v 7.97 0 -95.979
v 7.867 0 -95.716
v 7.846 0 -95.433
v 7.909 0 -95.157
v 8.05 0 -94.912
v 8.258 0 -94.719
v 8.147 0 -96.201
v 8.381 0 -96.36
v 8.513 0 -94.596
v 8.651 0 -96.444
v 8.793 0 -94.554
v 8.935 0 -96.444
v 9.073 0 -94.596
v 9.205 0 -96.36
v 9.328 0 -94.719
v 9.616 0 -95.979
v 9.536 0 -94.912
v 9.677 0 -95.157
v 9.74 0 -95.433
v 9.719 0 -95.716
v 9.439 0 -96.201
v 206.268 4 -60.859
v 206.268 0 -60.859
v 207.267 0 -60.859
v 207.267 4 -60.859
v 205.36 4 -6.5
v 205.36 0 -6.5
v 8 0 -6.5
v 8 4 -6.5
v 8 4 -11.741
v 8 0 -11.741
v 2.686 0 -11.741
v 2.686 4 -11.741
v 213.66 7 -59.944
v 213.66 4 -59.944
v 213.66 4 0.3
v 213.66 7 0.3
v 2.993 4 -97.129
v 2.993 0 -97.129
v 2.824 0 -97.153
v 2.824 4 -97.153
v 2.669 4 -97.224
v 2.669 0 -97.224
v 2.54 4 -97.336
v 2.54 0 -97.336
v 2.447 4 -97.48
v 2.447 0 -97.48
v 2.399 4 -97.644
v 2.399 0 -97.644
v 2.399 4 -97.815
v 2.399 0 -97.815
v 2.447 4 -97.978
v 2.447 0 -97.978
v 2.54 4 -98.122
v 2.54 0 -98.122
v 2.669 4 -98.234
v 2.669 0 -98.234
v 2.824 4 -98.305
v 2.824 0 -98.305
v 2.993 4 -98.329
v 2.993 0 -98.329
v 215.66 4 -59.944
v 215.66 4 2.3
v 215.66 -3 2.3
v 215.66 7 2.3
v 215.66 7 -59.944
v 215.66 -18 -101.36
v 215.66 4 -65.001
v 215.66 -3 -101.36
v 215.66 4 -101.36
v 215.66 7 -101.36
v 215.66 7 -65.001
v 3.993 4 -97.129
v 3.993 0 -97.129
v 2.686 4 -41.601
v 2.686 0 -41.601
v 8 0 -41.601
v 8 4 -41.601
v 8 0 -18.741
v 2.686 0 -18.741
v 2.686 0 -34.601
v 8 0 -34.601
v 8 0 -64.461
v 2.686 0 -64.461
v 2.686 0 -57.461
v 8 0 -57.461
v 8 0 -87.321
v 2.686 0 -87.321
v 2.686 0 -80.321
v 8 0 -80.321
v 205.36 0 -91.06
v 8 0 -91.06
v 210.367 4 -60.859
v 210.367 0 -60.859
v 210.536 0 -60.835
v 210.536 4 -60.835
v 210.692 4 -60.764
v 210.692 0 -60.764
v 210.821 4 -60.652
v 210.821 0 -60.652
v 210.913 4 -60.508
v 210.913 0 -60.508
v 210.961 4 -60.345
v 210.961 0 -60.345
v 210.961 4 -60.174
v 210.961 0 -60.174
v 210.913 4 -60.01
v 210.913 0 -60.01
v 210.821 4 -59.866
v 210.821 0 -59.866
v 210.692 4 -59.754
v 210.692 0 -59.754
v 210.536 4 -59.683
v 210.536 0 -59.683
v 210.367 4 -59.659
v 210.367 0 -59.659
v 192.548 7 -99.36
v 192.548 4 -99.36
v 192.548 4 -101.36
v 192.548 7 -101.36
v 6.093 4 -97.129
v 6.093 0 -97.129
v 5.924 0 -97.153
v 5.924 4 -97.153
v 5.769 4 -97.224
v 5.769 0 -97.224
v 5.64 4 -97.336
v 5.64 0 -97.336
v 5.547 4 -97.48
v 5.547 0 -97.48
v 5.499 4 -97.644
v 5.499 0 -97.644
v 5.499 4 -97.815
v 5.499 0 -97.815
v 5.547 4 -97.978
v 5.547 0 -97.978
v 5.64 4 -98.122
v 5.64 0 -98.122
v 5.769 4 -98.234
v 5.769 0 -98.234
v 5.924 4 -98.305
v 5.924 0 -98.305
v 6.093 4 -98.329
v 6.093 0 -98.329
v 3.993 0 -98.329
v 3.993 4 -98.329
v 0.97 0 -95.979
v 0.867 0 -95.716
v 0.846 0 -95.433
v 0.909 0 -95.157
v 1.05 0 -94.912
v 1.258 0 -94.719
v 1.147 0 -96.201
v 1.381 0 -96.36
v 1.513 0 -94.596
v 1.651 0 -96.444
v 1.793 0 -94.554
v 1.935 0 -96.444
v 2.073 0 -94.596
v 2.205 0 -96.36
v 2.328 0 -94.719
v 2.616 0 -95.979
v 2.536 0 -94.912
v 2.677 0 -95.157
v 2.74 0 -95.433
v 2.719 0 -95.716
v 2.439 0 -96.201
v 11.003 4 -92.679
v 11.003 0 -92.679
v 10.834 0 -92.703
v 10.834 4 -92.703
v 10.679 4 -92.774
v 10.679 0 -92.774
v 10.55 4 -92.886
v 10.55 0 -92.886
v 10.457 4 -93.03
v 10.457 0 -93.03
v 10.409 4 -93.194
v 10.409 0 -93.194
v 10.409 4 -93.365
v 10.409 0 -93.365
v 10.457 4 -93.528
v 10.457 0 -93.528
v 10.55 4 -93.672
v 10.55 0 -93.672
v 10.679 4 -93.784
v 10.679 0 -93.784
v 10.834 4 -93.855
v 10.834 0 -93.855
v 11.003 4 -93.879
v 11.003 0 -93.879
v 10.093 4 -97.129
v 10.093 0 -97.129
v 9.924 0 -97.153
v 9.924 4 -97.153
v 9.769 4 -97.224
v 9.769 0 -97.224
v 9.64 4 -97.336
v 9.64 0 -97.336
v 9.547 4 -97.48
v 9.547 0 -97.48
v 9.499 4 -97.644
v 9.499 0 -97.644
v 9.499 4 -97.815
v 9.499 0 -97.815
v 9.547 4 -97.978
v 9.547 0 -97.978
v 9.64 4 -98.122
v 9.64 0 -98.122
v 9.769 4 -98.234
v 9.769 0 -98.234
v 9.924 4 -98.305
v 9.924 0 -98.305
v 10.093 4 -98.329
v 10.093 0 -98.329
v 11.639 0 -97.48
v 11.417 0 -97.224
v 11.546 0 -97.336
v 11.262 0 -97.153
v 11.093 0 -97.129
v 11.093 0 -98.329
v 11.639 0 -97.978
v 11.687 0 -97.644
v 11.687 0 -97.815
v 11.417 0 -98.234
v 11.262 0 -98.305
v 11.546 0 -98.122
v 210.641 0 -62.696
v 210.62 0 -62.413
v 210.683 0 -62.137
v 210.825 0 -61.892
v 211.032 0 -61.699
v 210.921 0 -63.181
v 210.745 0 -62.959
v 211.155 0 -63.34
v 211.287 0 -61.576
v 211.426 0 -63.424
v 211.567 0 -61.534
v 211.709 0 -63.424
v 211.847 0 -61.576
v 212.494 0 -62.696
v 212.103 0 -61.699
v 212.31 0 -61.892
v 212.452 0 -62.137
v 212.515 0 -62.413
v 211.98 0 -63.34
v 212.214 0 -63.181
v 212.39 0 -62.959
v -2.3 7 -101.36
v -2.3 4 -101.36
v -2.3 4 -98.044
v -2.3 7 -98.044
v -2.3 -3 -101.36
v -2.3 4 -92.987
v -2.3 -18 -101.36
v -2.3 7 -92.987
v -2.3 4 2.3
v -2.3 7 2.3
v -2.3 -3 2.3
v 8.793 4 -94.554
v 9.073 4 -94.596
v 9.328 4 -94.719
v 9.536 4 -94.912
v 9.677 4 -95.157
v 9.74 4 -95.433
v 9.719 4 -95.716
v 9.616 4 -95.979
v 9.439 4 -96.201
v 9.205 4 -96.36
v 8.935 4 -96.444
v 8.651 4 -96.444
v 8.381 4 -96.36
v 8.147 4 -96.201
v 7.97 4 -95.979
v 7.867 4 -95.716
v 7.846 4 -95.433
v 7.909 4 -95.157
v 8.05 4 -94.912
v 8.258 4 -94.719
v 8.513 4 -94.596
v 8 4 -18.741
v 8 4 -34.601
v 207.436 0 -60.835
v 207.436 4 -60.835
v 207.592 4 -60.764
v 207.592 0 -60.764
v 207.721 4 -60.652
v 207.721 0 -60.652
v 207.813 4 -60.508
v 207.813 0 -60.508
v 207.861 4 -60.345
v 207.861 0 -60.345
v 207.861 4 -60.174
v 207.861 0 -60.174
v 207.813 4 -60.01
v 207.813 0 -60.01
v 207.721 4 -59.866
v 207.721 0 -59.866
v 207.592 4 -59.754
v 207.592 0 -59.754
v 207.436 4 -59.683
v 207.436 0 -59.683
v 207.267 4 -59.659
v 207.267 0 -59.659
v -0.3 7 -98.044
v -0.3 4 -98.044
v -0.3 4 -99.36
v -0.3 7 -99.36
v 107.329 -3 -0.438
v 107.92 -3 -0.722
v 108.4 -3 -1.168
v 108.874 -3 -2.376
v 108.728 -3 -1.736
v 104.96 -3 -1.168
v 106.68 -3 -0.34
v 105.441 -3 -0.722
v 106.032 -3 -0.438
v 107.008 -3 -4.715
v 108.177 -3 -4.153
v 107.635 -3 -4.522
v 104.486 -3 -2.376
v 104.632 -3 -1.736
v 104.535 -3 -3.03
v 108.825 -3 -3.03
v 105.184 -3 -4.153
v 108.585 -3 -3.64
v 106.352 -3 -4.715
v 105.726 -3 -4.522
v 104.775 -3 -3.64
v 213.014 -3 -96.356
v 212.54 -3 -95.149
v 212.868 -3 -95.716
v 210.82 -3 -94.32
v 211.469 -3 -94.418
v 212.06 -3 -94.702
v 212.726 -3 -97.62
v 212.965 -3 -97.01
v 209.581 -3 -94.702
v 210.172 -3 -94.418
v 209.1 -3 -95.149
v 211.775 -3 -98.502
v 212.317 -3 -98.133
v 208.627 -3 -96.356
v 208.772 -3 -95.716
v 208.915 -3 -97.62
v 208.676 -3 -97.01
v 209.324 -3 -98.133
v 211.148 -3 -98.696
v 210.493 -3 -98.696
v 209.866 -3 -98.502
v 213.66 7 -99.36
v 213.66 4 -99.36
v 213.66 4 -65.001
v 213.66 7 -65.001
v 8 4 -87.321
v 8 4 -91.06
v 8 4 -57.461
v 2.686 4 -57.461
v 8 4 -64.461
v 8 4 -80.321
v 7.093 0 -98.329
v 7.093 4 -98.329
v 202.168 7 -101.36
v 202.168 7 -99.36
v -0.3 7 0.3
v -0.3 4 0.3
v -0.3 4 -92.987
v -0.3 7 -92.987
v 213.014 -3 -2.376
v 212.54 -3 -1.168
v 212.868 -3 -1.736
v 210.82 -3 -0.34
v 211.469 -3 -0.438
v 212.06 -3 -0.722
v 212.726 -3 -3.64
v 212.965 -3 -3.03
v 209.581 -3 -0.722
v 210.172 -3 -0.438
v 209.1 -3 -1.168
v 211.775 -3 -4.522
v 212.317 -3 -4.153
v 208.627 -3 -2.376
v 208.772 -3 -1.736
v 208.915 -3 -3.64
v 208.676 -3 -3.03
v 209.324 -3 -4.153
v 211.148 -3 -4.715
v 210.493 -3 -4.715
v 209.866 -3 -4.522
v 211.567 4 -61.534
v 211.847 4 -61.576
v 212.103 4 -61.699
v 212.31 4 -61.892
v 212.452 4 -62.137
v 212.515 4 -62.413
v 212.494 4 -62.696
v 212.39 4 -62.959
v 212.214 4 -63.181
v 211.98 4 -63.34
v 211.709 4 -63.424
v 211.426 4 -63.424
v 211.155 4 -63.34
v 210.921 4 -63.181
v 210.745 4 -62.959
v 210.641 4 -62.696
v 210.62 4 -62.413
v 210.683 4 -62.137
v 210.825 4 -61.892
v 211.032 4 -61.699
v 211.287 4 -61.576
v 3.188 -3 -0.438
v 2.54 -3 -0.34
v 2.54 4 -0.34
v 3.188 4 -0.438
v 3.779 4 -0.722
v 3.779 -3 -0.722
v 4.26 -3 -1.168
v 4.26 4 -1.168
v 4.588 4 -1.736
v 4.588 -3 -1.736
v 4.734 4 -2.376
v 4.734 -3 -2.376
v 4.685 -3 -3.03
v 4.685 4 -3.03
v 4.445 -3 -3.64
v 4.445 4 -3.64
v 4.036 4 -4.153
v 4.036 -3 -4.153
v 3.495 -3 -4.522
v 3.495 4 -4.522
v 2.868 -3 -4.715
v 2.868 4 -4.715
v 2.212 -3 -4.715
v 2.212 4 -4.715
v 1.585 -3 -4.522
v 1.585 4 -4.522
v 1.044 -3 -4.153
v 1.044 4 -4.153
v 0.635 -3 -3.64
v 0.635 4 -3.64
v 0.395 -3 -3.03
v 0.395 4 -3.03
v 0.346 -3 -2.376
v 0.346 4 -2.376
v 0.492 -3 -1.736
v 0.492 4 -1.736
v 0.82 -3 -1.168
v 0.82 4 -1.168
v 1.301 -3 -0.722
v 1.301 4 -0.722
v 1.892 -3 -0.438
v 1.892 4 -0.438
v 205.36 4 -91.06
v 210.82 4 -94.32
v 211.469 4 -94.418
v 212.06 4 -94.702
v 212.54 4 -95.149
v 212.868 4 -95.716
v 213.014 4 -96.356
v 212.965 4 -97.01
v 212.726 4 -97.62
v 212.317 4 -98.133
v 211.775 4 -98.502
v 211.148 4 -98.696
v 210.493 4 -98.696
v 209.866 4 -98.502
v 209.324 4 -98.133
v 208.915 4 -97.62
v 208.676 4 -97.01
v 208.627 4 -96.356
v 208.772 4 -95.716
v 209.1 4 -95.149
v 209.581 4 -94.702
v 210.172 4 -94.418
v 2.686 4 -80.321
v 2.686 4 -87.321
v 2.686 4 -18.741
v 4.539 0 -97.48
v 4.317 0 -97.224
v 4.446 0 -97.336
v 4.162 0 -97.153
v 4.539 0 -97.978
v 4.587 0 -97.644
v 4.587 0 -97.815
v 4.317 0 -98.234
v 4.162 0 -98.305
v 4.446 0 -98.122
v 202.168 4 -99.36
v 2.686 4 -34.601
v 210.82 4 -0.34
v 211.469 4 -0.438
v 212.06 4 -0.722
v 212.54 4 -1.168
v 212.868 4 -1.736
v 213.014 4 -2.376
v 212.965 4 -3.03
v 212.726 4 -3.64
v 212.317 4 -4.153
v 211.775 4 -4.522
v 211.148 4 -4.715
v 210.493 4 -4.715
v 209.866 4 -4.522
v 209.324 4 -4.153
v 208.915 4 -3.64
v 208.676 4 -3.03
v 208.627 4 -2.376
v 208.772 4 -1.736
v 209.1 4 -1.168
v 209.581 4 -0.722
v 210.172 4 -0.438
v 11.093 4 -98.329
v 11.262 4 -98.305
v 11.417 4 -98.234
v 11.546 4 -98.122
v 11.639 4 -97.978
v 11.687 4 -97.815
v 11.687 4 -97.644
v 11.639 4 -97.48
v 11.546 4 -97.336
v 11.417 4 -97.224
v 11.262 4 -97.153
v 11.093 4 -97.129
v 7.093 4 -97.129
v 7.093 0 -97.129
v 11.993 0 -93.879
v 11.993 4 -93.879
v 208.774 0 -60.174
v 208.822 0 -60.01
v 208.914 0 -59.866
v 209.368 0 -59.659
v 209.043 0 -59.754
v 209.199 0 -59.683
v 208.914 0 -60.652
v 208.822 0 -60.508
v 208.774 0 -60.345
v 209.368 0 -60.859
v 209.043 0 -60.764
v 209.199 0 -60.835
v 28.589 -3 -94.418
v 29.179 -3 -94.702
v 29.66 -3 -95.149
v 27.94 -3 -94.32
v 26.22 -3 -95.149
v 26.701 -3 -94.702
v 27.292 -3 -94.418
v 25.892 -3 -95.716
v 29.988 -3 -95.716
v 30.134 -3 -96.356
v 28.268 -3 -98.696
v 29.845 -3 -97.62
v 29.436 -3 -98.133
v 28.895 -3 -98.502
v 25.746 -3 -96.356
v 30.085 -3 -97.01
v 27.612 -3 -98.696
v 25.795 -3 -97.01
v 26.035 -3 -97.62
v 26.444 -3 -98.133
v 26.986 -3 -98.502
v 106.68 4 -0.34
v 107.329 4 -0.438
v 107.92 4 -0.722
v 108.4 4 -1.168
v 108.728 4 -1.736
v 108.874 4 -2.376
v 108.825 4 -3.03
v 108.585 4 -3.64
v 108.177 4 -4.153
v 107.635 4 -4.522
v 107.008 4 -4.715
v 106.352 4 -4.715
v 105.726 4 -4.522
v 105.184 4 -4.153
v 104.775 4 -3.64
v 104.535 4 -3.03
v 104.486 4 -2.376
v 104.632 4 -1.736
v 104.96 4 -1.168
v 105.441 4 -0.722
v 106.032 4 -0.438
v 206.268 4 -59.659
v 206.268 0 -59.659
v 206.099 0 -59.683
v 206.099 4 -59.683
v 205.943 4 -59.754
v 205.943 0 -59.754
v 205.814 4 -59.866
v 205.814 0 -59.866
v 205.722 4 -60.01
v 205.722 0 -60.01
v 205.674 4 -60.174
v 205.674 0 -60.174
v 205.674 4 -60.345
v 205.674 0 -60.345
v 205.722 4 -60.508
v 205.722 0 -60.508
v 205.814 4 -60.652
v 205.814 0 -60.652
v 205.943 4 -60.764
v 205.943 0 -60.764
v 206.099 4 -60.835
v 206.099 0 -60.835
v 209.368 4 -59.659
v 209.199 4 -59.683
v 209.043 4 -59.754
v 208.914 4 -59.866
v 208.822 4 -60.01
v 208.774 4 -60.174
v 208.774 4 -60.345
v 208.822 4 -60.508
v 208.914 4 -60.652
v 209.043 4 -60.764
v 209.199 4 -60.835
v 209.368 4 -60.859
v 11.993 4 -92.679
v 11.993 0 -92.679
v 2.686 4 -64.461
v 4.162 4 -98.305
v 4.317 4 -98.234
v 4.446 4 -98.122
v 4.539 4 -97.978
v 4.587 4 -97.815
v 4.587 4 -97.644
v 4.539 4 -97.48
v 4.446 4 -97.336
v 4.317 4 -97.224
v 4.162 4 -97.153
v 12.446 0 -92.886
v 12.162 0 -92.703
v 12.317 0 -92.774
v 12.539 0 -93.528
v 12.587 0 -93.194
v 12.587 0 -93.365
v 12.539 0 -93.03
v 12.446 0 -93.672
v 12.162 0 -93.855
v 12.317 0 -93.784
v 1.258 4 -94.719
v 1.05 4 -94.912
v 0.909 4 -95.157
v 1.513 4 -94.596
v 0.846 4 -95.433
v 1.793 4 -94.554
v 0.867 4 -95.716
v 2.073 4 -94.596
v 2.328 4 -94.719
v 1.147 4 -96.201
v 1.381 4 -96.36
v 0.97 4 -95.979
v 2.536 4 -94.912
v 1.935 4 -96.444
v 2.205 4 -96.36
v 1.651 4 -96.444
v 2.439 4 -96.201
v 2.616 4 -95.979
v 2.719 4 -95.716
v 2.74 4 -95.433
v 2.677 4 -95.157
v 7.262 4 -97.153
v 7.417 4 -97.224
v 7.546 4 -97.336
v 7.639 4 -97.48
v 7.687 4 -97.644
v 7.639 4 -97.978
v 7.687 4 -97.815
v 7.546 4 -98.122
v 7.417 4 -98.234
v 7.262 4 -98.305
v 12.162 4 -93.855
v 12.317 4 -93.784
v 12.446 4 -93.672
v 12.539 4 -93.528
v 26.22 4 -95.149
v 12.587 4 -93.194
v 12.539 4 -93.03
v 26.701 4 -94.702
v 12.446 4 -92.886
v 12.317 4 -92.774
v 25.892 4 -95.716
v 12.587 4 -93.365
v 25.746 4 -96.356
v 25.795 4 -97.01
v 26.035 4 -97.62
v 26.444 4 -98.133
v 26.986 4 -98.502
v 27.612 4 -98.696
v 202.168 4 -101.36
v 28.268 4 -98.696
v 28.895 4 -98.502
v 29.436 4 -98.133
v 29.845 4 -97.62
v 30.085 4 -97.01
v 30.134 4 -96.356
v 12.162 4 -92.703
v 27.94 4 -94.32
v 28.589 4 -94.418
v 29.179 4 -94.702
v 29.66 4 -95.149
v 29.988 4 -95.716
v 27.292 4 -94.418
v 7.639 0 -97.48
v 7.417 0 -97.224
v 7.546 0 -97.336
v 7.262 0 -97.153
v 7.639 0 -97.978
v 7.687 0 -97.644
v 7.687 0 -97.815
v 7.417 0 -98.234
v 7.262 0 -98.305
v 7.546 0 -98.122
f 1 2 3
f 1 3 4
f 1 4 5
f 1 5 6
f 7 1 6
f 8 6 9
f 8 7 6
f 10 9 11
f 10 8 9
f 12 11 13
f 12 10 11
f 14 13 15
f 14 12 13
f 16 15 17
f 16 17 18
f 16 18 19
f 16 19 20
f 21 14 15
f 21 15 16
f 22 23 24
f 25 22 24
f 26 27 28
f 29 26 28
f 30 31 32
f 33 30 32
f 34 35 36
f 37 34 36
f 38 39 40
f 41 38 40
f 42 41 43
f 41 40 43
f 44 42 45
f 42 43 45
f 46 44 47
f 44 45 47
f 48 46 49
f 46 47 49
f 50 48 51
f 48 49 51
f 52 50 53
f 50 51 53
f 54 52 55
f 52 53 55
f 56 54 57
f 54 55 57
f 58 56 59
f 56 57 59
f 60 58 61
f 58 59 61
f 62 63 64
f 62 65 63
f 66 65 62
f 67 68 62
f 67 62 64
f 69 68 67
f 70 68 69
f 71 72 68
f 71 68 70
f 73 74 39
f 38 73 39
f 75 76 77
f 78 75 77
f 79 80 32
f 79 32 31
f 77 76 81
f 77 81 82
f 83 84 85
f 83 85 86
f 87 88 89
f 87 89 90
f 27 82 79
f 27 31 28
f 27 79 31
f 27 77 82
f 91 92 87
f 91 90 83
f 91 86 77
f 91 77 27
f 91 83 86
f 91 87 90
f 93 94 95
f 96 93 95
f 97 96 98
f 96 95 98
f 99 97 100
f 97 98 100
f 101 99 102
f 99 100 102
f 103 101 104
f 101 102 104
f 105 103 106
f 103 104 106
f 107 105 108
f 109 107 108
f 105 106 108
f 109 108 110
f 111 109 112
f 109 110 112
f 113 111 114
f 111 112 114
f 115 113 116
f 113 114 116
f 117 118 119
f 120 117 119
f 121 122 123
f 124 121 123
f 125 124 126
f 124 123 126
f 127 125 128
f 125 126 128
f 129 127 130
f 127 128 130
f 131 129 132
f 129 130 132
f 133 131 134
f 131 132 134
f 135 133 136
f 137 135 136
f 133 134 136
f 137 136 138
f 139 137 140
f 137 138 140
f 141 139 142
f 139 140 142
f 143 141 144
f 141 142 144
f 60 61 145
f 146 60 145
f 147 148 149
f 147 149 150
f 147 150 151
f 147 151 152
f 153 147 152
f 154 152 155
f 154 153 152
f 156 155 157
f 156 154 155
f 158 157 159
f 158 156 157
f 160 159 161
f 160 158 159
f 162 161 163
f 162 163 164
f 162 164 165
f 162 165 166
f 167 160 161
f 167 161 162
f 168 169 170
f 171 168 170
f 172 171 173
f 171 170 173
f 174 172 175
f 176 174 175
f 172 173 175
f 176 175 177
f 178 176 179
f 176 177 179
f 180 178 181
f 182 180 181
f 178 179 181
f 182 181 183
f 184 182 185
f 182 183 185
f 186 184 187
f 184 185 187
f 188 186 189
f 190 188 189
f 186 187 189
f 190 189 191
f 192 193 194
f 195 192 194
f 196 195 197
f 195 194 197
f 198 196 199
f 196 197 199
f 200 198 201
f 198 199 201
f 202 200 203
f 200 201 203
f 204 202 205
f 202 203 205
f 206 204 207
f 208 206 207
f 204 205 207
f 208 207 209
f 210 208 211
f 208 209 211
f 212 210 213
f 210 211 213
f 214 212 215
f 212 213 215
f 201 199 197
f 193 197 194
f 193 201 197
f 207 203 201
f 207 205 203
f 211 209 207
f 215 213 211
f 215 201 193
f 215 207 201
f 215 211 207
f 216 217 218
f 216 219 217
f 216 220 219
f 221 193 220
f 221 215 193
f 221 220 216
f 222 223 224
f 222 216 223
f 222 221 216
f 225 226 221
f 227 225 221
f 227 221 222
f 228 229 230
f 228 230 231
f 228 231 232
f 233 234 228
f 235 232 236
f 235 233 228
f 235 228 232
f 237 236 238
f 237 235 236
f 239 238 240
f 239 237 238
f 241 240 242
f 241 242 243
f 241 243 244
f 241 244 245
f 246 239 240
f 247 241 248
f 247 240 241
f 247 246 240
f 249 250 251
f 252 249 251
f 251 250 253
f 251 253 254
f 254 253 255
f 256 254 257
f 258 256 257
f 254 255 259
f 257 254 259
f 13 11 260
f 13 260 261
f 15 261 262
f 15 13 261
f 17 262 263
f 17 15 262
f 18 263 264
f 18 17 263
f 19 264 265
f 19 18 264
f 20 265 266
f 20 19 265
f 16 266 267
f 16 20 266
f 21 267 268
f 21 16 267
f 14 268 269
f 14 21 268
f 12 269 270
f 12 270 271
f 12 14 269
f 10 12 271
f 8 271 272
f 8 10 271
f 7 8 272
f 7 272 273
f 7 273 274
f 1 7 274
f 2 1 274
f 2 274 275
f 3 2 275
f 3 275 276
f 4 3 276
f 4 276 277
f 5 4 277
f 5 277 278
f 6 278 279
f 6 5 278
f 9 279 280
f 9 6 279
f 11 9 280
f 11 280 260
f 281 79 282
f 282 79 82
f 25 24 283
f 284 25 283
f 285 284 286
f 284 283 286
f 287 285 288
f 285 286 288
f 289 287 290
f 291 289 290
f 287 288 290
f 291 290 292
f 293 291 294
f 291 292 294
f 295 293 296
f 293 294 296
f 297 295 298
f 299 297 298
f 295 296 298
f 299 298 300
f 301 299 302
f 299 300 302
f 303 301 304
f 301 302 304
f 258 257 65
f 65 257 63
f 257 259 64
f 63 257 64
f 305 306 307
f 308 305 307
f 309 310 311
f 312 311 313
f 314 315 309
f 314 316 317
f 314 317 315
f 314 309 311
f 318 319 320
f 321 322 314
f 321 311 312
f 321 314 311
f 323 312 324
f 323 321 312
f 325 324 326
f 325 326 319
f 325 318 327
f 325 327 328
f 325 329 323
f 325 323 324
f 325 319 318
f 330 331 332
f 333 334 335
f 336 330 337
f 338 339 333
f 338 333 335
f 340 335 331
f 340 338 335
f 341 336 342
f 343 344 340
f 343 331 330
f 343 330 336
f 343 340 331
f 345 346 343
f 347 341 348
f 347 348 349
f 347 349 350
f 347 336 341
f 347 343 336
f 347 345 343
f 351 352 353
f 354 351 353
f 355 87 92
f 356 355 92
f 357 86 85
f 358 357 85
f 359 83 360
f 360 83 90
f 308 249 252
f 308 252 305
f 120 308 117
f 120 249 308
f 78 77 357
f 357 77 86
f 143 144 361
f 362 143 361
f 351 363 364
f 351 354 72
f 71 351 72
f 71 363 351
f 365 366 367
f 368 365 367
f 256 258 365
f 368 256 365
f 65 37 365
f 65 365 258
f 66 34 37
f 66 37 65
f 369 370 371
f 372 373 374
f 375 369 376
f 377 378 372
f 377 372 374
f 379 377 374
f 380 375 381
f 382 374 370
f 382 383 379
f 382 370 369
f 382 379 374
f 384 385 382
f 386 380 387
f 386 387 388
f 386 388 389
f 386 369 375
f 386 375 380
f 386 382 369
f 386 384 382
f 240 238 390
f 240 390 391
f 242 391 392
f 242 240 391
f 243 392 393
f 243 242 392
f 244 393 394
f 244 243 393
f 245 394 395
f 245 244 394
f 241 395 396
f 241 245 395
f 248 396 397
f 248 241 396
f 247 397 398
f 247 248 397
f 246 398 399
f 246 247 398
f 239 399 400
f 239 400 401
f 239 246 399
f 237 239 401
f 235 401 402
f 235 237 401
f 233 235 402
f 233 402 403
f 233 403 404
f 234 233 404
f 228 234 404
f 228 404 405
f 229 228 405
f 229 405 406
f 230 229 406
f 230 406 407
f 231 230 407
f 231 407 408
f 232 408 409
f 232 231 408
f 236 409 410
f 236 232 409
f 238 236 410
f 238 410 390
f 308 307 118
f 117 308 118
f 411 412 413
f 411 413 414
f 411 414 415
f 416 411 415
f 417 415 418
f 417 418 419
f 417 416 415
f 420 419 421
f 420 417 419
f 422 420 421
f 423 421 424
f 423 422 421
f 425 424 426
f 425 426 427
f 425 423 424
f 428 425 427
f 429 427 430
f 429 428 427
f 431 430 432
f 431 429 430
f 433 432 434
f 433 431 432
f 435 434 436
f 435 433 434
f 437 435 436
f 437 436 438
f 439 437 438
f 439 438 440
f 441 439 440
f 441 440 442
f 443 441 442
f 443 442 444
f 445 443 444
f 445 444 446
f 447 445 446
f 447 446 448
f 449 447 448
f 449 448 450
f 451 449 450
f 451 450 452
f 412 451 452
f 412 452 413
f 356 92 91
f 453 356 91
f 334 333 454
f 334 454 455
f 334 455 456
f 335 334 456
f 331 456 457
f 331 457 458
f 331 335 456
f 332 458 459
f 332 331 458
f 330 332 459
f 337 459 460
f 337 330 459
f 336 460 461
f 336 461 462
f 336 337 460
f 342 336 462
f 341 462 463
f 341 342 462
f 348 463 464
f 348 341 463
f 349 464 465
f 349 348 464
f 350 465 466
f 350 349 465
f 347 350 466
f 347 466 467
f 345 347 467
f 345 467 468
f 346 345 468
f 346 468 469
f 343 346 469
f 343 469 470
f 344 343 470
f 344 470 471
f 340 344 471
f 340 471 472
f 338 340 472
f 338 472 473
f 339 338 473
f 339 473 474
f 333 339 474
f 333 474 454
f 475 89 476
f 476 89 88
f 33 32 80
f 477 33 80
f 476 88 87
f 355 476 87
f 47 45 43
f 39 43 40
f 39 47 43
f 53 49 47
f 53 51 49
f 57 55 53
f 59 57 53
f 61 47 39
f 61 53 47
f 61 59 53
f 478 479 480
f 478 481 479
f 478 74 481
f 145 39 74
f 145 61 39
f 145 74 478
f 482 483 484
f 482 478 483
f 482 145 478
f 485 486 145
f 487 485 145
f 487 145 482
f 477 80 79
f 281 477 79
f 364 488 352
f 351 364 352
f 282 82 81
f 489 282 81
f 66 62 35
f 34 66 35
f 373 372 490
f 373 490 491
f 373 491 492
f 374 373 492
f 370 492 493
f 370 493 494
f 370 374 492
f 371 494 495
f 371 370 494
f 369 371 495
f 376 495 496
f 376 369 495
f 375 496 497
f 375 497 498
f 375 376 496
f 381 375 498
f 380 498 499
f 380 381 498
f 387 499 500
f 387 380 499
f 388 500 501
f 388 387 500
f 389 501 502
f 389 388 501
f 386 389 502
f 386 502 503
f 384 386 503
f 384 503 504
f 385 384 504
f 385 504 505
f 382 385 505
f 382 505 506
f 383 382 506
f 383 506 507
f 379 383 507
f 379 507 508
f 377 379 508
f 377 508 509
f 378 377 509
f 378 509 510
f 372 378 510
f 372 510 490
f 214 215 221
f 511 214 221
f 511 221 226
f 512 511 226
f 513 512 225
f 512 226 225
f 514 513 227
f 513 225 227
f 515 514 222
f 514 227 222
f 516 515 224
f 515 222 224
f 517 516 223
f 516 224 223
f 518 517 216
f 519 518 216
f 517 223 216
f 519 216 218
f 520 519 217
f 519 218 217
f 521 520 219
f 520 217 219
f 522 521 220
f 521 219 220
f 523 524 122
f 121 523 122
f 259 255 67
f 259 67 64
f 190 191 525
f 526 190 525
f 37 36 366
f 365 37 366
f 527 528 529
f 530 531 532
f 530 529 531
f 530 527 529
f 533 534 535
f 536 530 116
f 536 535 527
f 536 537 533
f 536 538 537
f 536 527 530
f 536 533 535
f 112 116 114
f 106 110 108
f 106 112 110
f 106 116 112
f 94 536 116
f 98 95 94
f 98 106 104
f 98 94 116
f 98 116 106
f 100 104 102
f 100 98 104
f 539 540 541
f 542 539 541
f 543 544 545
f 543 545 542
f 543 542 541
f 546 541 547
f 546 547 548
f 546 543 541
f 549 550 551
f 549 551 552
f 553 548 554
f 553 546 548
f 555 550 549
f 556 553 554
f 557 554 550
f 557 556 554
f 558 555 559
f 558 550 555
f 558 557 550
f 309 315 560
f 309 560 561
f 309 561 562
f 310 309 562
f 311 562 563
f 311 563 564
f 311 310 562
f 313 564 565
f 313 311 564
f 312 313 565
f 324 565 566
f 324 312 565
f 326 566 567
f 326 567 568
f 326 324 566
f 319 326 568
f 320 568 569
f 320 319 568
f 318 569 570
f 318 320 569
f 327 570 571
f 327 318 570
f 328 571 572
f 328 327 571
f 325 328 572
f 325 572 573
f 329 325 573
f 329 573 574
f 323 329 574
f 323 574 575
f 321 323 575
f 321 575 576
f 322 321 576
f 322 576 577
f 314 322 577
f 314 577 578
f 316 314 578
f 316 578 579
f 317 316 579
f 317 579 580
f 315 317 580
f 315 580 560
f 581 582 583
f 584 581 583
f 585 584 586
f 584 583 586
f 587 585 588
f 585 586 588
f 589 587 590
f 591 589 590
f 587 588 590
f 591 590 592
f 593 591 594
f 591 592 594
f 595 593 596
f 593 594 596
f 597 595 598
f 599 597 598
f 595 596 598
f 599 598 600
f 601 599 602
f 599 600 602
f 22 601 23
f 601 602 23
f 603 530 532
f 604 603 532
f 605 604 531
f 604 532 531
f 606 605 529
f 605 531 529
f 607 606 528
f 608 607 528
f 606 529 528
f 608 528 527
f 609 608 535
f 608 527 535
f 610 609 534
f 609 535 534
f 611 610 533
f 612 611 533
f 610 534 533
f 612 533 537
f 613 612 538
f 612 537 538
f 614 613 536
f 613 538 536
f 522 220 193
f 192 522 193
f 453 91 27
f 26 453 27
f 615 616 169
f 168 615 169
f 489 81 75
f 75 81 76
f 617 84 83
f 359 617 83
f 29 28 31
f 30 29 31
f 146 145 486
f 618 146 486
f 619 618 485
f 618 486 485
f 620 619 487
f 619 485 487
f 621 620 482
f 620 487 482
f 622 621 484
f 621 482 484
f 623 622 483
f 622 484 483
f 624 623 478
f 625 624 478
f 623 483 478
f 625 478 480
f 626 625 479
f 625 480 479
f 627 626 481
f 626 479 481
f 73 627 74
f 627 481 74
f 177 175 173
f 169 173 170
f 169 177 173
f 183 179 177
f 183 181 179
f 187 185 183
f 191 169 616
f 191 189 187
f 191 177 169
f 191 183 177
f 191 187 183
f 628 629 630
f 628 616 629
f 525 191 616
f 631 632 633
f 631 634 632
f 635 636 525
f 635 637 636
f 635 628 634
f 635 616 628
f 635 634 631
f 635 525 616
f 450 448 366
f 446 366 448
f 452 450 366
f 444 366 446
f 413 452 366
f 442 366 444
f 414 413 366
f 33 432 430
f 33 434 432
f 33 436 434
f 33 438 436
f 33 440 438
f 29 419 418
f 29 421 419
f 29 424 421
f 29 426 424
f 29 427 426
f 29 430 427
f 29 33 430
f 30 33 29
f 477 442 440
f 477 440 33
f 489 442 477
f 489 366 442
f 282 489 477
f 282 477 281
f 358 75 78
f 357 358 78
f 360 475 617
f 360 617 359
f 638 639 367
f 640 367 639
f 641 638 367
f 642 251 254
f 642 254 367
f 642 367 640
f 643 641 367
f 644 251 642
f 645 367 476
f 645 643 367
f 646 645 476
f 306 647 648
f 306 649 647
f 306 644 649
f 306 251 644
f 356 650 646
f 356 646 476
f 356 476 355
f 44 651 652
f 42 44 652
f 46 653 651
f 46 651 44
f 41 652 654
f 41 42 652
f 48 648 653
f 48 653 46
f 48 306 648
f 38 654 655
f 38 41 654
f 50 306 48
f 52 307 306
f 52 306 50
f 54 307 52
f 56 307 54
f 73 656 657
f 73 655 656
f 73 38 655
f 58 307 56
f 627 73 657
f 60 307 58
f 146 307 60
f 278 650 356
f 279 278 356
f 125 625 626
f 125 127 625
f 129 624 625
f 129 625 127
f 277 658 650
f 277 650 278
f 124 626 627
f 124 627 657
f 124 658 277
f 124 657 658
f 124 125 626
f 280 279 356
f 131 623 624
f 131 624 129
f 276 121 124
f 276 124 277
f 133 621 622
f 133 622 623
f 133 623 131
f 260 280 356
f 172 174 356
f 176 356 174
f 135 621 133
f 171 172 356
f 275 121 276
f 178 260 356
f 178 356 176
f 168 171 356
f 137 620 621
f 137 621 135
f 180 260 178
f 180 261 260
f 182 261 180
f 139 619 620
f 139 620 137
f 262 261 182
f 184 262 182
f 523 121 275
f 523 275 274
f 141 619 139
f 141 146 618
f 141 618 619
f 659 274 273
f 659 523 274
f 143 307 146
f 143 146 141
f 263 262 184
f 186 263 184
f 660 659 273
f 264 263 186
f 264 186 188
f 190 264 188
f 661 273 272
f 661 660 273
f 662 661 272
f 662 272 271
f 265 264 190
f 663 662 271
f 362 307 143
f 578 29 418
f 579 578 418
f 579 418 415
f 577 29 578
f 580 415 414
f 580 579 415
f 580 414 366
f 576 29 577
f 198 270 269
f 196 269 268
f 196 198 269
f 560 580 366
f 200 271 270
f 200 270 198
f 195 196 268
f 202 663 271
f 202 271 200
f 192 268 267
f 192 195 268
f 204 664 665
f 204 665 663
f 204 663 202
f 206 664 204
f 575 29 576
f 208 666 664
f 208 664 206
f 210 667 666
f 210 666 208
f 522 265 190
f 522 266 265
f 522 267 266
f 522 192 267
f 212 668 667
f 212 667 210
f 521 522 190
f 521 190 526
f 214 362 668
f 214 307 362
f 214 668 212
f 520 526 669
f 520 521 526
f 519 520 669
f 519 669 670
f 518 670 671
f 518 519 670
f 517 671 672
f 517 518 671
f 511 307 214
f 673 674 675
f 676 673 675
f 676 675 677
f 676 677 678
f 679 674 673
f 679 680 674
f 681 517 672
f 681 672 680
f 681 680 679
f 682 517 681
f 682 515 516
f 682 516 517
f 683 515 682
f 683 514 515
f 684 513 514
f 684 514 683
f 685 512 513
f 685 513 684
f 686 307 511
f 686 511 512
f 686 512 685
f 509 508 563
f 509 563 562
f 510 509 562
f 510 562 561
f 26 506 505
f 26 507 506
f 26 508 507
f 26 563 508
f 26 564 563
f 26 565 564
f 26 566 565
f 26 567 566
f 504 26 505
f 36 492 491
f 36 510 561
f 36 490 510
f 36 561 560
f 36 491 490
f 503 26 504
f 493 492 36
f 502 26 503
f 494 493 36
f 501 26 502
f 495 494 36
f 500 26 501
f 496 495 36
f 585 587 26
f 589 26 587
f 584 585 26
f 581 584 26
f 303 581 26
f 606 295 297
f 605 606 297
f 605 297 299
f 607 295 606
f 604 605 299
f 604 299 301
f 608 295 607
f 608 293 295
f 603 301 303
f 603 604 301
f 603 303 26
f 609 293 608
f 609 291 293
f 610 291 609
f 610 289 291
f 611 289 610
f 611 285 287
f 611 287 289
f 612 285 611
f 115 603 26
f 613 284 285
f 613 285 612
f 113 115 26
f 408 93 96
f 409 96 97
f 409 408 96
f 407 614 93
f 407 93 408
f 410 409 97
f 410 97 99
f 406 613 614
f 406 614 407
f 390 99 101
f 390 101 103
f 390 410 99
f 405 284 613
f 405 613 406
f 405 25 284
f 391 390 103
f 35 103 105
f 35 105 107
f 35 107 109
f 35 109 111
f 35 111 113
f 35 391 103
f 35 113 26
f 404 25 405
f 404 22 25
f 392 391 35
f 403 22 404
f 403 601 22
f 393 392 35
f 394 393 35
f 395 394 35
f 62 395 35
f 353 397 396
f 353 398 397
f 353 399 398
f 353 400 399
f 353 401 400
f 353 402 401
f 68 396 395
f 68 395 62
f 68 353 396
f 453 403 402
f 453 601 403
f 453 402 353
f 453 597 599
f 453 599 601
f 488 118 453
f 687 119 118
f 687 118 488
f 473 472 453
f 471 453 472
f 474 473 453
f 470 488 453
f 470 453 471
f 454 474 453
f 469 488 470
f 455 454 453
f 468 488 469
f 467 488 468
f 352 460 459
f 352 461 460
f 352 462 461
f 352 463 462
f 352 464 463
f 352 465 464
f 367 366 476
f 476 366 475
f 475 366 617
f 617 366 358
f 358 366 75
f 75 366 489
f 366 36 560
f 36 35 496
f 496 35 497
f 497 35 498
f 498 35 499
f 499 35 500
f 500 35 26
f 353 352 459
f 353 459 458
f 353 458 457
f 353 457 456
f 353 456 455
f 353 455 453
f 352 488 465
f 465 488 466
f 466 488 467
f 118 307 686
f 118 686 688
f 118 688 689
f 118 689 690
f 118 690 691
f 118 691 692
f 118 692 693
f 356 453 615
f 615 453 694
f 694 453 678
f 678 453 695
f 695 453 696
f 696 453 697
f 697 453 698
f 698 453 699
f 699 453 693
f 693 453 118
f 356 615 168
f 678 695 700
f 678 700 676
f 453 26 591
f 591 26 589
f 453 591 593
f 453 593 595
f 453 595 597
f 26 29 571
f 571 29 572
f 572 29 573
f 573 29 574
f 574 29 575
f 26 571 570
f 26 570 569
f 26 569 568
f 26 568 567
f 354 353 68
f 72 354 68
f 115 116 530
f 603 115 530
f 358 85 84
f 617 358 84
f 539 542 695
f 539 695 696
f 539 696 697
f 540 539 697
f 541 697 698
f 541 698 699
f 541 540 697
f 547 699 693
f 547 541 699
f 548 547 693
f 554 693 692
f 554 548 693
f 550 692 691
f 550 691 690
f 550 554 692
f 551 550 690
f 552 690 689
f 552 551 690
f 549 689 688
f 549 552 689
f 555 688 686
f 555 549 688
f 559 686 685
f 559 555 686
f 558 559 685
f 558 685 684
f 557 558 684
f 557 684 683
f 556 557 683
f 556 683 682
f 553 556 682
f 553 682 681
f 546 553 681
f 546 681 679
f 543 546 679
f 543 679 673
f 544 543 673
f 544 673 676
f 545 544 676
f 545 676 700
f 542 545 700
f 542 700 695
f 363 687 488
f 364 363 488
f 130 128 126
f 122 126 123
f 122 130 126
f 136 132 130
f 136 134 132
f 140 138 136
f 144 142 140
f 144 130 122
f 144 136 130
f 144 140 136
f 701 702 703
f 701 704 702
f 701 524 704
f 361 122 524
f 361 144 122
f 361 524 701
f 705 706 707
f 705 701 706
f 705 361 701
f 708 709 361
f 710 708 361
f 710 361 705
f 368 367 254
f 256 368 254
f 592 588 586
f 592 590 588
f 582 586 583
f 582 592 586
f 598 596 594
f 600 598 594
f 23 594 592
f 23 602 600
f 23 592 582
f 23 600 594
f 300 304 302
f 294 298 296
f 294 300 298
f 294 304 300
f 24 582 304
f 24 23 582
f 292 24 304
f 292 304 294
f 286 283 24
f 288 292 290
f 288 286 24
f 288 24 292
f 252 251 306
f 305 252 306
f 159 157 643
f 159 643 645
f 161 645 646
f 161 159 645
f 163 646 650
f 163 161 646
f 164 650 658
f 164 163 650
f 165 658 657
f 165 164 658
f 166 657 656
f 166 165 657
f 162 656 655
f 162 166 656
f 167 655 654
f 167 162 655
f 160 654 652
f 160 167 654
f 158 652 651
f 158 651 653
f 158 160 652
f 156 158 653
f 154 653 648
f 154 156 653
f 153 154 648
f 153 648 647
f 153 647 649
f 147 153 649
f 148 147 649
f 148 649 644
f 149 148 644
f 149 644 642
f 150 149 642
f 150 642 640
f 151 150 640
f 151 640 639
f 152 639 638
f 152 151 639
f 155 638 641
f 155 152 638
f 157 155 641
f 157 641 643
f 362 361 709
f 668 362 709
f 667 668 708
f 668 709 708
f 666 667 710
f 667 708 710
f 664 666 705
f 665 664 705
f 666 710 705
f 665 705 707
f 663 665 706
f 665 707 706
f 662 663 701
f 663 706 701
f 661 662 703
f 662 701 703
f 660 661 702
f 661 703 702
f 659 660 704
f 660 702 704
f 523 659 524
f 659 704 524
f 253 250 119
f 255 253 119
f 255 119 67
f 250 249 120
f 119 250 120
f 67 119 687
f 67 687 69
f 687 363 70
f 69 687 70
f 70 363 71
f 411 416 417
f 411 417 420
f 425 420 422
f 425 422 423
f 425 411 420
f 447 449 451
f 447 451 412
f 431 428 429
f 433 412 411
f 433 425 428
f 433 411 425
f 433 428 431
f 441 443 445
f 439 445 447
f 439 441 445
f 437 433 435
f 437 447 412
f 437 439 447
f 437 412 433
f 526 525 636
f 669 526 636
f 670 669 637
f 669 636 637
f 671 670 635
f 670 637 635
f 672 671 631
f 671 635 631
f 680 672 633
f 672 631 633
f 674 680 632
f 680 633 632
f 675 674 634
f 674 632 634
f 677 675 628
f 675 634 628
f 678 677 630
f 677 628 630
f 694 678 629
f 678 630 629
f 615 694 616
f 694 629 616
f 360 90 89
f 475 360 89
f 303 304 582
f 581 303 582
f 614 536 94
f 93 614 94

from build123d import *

# Parameters (mm, degrees)
SKETCH4_W           = 217.960426721
SKETCH4_H           = 103.66019812
SKETCH4_R           = 2.2
SKETCH4_R_2         = 0.95
BOSS_EXTRUDE1_DEPTH = 4
SKETCH4_7_W         = 217.960426721
SKETCH4_7_H         = 103.66019812
BOSS_EXTRUDE2_DEPTH = 3
CUT_EXTRUDE1_START  = -3
SKETCH4_8_R         = 2.2
CUT_EXTRUDE1_DEPTH  = 3
BOSS_EXTRUDE3_START = 4
BOSS_EXTRUDE3_DEPTH = 3
BOSS_EXTRUDE4_DEPTH = 217.960426721


with BuildPart() as part:
    # Sketch4 → Boss-Extrude1 (new body)
    with BuildSketch(Plane(origin=(0, 0, 0), x_dir=(1, 0, 0), z_dir=(0, 1, 0))):
        with Locations((106.680213361, 49.53009906)):
            Rectangle(SKETCH4_W, SKETCH4_H)
        with Locations(Location((2.54000508, 2.54000508, 0), (0, 0, 270))):
            Circle(SKETCH4_R, mode=Mode.SUBTRACT)
        with Locations(Location((106.68021336, 2.54000508, 0), (0, 0, 270))):
            Circle(SKETCH4_R, mode=Mode.SUBTRACT)
        Polygon((205.360426721, 91.06019812), (205.360426721, 6.5), (8, 6.5), (8, 11.741046482), (2.686004572, 11.741046482), (2.686004572, 18.741046482), (8, 18.741046482), (8, 34.601092202), (2.686004572, 34.601092202), (2.686004572, 41.601092202), (8, 41.601092202), (8, 57.461137922), (2.686004572, 57.461137922), (2.686004572, 64.461137922), (8, 64.461137922), (8, 80.321183642), (2.686004572, 80.321183642), (2.686004572, 87.321183642), (8, 87.321183642), (8, 91.06019812), align=None, mode=Mode.SUBTRACT)
        with Locations(Location((210.820421641, 2.54000508, 0), (0, 0, 270))):
            Circle(SKETCH4_R, mode=Mode.SUBTRACT)
        with Locations(Location((1.792989586, 95.504191008, 0), (0, 0, 270))):
            Circle(SKETCH4_R_2, mode=Mode.SUBTRACT)
        with BuildLine():
            ThreePointArc((11.003022606, 92.679171958), (10.403022606, 93.279171958), (11.003022606, 93.879171958))
            Line((11.003022606, 93.879171958), (11.992807214, 93.879171958))
            ThreePointArc((11.992807214, 93.879171958), (12.592808272, 93.279171958), (11.992807214, 92.679171958))
            Line((11.992807214, 92.679171958), (11.003022606, 92.679171958))
        make_face(mode=Mode.SUBTRACT)
        with Locations(Location((8.792989586, 95.504191008, 0), (0, 0, 270))):
            Circle(SKETCH4_R_2, mode=Mode.SUBTRACT)
        with BuildLine():
            ThreePointArc((2.993222758, 97.129182542), (2.393222758, 97.729182542), (2.993222758, 98.329182542))
            Line((2.993222758, 98.329182542), (3.992807214, 98.329182542))
            ThreePointArc((3.992807214, 98.329182542), (4.592807214, 97.729182542), (3.992807214, 97.129182542))
            Line((3.992807214, 97.129182542), (2.993222758, 97.129182542))
        make_face(mode=Mode.SUBTRACT)
        with BuildLine():
            ThreePointArc((6.093221234, 97.129182542), (5.493221234, 97.729182542), (6.093221234, 98.329182542))
            Line((6.093221234, 98.329182542), (7.09280569, 98.329182542))
            ThreePointArc((7.09280569, 98.329182542), (7.69280569, 97.729182542), (7.09280569, 97.129182542))
            Line((7.09280569, 97.129182542), (6.093221234, 97.129182542))
        make_face(mode=Mode.SUBTRACT)
        with BuildLine():
            ThreePointArc((10.093221234, 97.129182542), (9.493221234, 97.729182542), (10.093221234, 98.329182542))
            Line((10.093221234, 98.329182542), (11.09280569, 98.329182542))
            ThreePointArc((11.09280569, 98.329182542), (11.69280569, 97.729182542), (11.09280569, 97.129182542))
            Line((11.09280569, 97.129182542), (10.093221234, 97.129182542))
        make_face(mode=Mode.SUBTRACT)
        with Locations(Location((27.94005588, 96.52019304, 0), (0, 0, 270))):
            Circle(SKETCH4_R, mode=Mode.SUBTRACT)
        with BuildLine():
            ThreePointArc((206.267621031, 59.659133435), (205.667621031, 60.259133435), (206.267621031, 60.859133435))
            Line((206.267621031, 60.859133435), (207.267205486, 60.859133435))
            ThreePointArc((207.267205486, 60.859133435), (207.867205486, 60.259133435), (207.267205486, 59.659133435))
            Line((207.267205486, 59.659133435), (206.267621031, 59.659133435))
        make_face(mode=Mode.SUBTRACT)
        with BuildLine():
            ThreePointArc((209.367619507, 59.659133435), (208.767619507, 60.259133435), (209.367619507, 60.859133435))
            Line((209.367619507, 60.859133435), (210.367203962, 60.859133435))
            ThreePointArc((210.367203962, 60.859133435), (210.967203962, 60.259133435), (210.367203962, 59.659133435))
            Line((210.367203962, 59.659133435), (209.367619507, 59.659133435))
        make_face(mode=Mode.SUBTRACT)
        with Locations(Location((211.567437135, 62.484124968, 0), (0, 0, 270))):
            Circle(SKETCH4_R_2, mode=Mode.SUBTRACT)
        with Locations(Location((210.820421641, 96.52019304, 0), (0, 0, 270))):
            Circle(SKETCH4_R, mode=Mode.SUBTRACT)
    extrude(amount=BOSS_EXTRUDE1_DEPTH)

    # Sketch4<7> → Boss-Extrude2 (add)
    with BuildSketch(Plane(origin=(0, 0, 0), x_dir=(1, 0, 0), z_dir=(0, 1, 0))):
        with Locations((106.680213361, 49.53009906)):
            Rectangle(SKETCH4_7_W, SKETCH4_7_H)
    extrude(amount=-BOSS_EXTRUDE2_DEPTH)

    # Sketch4<8> → Cut-Extrude1 (cut)
    with BuildSketch(Plane(origin=(0, 0, 0), x_dir=(1, 0, 0), z_dir=(0, 1, 0)).offset(CUT_EXTRUDE1_START)):
        with Locations(Location((27.94005588, 96.52019304, 0), (0, 0, 270))):
            Circle(SKETCH4_8_R)
        with Locations(Location((210.820421641, 96.52019304, 0), (0, 0, 270))):
            Circle(SKETCH4_8_R)
        with Locations(Location((210.820421641, 2.54000508, 0), (0, 0, 270))):
            Circle(SKETCH4_8_R)
        with Locations(Location((106.68021336, 2.54000508, 0), (0, 0, 270))):
            Circle(SKETCH4_8_R)
        with Locations(Location((2.54000508, 2.54000508, 0), (0, 0, 270))):
            Circle(SKETCH4_8_R)
    extrude(amount=CUT_EXTRUDE1_DEPTH, mode=Mode.SUBTRACT)

    # Sketch4<10> → Boss-Extrude3 (add)
    with BuildSketch(Plane(origin=(0, 0, 0), x_dir=(1, 0, 0), z_dir=(0, 1, 0)).offset(BOSS_EXTRUDE3_START)):
        Polygon((-0.3, -0.3), (-0.3, 92.987071374), (-2.3, 92.987071374), (-2.3, -2.3), (215.660426721, -2.3), (215.660426721, 59.944119888), (213.660426721, 59.944119888), (213.660426721, -0.3), align=None)
        Polygon((-0.3, 99.36019812), (192.548387097, 99.36019812), (192.548387097, 101.36019812), (-2.3, 101.36019812), (-2.3, 98.044196088), (-0.3, 98.044196088), align=None)
        Polygon((202.168402337, 101.36019812), (202.168402337, 99.36019812), (213.660426721, 99.36019812), (213.660426721, 65.001244602), (215.660426721, 65.001244602), (215.660426721, 101.36019812), align=None)
    extrude(amount=BOSS_EXTRUDE3_DEPTH)

    # Sketch5 → Boss-Extrude4 (add)
    with BuildSketch(Plane.ZY.offset(2.3)):
        Polygon((2.3, -3), (-101.36019812, -3), (-101.36019812, -18), align=None)
    extrude(amount=-BOSS_EXTRUDE4_DEPTH)


solid = part.part
